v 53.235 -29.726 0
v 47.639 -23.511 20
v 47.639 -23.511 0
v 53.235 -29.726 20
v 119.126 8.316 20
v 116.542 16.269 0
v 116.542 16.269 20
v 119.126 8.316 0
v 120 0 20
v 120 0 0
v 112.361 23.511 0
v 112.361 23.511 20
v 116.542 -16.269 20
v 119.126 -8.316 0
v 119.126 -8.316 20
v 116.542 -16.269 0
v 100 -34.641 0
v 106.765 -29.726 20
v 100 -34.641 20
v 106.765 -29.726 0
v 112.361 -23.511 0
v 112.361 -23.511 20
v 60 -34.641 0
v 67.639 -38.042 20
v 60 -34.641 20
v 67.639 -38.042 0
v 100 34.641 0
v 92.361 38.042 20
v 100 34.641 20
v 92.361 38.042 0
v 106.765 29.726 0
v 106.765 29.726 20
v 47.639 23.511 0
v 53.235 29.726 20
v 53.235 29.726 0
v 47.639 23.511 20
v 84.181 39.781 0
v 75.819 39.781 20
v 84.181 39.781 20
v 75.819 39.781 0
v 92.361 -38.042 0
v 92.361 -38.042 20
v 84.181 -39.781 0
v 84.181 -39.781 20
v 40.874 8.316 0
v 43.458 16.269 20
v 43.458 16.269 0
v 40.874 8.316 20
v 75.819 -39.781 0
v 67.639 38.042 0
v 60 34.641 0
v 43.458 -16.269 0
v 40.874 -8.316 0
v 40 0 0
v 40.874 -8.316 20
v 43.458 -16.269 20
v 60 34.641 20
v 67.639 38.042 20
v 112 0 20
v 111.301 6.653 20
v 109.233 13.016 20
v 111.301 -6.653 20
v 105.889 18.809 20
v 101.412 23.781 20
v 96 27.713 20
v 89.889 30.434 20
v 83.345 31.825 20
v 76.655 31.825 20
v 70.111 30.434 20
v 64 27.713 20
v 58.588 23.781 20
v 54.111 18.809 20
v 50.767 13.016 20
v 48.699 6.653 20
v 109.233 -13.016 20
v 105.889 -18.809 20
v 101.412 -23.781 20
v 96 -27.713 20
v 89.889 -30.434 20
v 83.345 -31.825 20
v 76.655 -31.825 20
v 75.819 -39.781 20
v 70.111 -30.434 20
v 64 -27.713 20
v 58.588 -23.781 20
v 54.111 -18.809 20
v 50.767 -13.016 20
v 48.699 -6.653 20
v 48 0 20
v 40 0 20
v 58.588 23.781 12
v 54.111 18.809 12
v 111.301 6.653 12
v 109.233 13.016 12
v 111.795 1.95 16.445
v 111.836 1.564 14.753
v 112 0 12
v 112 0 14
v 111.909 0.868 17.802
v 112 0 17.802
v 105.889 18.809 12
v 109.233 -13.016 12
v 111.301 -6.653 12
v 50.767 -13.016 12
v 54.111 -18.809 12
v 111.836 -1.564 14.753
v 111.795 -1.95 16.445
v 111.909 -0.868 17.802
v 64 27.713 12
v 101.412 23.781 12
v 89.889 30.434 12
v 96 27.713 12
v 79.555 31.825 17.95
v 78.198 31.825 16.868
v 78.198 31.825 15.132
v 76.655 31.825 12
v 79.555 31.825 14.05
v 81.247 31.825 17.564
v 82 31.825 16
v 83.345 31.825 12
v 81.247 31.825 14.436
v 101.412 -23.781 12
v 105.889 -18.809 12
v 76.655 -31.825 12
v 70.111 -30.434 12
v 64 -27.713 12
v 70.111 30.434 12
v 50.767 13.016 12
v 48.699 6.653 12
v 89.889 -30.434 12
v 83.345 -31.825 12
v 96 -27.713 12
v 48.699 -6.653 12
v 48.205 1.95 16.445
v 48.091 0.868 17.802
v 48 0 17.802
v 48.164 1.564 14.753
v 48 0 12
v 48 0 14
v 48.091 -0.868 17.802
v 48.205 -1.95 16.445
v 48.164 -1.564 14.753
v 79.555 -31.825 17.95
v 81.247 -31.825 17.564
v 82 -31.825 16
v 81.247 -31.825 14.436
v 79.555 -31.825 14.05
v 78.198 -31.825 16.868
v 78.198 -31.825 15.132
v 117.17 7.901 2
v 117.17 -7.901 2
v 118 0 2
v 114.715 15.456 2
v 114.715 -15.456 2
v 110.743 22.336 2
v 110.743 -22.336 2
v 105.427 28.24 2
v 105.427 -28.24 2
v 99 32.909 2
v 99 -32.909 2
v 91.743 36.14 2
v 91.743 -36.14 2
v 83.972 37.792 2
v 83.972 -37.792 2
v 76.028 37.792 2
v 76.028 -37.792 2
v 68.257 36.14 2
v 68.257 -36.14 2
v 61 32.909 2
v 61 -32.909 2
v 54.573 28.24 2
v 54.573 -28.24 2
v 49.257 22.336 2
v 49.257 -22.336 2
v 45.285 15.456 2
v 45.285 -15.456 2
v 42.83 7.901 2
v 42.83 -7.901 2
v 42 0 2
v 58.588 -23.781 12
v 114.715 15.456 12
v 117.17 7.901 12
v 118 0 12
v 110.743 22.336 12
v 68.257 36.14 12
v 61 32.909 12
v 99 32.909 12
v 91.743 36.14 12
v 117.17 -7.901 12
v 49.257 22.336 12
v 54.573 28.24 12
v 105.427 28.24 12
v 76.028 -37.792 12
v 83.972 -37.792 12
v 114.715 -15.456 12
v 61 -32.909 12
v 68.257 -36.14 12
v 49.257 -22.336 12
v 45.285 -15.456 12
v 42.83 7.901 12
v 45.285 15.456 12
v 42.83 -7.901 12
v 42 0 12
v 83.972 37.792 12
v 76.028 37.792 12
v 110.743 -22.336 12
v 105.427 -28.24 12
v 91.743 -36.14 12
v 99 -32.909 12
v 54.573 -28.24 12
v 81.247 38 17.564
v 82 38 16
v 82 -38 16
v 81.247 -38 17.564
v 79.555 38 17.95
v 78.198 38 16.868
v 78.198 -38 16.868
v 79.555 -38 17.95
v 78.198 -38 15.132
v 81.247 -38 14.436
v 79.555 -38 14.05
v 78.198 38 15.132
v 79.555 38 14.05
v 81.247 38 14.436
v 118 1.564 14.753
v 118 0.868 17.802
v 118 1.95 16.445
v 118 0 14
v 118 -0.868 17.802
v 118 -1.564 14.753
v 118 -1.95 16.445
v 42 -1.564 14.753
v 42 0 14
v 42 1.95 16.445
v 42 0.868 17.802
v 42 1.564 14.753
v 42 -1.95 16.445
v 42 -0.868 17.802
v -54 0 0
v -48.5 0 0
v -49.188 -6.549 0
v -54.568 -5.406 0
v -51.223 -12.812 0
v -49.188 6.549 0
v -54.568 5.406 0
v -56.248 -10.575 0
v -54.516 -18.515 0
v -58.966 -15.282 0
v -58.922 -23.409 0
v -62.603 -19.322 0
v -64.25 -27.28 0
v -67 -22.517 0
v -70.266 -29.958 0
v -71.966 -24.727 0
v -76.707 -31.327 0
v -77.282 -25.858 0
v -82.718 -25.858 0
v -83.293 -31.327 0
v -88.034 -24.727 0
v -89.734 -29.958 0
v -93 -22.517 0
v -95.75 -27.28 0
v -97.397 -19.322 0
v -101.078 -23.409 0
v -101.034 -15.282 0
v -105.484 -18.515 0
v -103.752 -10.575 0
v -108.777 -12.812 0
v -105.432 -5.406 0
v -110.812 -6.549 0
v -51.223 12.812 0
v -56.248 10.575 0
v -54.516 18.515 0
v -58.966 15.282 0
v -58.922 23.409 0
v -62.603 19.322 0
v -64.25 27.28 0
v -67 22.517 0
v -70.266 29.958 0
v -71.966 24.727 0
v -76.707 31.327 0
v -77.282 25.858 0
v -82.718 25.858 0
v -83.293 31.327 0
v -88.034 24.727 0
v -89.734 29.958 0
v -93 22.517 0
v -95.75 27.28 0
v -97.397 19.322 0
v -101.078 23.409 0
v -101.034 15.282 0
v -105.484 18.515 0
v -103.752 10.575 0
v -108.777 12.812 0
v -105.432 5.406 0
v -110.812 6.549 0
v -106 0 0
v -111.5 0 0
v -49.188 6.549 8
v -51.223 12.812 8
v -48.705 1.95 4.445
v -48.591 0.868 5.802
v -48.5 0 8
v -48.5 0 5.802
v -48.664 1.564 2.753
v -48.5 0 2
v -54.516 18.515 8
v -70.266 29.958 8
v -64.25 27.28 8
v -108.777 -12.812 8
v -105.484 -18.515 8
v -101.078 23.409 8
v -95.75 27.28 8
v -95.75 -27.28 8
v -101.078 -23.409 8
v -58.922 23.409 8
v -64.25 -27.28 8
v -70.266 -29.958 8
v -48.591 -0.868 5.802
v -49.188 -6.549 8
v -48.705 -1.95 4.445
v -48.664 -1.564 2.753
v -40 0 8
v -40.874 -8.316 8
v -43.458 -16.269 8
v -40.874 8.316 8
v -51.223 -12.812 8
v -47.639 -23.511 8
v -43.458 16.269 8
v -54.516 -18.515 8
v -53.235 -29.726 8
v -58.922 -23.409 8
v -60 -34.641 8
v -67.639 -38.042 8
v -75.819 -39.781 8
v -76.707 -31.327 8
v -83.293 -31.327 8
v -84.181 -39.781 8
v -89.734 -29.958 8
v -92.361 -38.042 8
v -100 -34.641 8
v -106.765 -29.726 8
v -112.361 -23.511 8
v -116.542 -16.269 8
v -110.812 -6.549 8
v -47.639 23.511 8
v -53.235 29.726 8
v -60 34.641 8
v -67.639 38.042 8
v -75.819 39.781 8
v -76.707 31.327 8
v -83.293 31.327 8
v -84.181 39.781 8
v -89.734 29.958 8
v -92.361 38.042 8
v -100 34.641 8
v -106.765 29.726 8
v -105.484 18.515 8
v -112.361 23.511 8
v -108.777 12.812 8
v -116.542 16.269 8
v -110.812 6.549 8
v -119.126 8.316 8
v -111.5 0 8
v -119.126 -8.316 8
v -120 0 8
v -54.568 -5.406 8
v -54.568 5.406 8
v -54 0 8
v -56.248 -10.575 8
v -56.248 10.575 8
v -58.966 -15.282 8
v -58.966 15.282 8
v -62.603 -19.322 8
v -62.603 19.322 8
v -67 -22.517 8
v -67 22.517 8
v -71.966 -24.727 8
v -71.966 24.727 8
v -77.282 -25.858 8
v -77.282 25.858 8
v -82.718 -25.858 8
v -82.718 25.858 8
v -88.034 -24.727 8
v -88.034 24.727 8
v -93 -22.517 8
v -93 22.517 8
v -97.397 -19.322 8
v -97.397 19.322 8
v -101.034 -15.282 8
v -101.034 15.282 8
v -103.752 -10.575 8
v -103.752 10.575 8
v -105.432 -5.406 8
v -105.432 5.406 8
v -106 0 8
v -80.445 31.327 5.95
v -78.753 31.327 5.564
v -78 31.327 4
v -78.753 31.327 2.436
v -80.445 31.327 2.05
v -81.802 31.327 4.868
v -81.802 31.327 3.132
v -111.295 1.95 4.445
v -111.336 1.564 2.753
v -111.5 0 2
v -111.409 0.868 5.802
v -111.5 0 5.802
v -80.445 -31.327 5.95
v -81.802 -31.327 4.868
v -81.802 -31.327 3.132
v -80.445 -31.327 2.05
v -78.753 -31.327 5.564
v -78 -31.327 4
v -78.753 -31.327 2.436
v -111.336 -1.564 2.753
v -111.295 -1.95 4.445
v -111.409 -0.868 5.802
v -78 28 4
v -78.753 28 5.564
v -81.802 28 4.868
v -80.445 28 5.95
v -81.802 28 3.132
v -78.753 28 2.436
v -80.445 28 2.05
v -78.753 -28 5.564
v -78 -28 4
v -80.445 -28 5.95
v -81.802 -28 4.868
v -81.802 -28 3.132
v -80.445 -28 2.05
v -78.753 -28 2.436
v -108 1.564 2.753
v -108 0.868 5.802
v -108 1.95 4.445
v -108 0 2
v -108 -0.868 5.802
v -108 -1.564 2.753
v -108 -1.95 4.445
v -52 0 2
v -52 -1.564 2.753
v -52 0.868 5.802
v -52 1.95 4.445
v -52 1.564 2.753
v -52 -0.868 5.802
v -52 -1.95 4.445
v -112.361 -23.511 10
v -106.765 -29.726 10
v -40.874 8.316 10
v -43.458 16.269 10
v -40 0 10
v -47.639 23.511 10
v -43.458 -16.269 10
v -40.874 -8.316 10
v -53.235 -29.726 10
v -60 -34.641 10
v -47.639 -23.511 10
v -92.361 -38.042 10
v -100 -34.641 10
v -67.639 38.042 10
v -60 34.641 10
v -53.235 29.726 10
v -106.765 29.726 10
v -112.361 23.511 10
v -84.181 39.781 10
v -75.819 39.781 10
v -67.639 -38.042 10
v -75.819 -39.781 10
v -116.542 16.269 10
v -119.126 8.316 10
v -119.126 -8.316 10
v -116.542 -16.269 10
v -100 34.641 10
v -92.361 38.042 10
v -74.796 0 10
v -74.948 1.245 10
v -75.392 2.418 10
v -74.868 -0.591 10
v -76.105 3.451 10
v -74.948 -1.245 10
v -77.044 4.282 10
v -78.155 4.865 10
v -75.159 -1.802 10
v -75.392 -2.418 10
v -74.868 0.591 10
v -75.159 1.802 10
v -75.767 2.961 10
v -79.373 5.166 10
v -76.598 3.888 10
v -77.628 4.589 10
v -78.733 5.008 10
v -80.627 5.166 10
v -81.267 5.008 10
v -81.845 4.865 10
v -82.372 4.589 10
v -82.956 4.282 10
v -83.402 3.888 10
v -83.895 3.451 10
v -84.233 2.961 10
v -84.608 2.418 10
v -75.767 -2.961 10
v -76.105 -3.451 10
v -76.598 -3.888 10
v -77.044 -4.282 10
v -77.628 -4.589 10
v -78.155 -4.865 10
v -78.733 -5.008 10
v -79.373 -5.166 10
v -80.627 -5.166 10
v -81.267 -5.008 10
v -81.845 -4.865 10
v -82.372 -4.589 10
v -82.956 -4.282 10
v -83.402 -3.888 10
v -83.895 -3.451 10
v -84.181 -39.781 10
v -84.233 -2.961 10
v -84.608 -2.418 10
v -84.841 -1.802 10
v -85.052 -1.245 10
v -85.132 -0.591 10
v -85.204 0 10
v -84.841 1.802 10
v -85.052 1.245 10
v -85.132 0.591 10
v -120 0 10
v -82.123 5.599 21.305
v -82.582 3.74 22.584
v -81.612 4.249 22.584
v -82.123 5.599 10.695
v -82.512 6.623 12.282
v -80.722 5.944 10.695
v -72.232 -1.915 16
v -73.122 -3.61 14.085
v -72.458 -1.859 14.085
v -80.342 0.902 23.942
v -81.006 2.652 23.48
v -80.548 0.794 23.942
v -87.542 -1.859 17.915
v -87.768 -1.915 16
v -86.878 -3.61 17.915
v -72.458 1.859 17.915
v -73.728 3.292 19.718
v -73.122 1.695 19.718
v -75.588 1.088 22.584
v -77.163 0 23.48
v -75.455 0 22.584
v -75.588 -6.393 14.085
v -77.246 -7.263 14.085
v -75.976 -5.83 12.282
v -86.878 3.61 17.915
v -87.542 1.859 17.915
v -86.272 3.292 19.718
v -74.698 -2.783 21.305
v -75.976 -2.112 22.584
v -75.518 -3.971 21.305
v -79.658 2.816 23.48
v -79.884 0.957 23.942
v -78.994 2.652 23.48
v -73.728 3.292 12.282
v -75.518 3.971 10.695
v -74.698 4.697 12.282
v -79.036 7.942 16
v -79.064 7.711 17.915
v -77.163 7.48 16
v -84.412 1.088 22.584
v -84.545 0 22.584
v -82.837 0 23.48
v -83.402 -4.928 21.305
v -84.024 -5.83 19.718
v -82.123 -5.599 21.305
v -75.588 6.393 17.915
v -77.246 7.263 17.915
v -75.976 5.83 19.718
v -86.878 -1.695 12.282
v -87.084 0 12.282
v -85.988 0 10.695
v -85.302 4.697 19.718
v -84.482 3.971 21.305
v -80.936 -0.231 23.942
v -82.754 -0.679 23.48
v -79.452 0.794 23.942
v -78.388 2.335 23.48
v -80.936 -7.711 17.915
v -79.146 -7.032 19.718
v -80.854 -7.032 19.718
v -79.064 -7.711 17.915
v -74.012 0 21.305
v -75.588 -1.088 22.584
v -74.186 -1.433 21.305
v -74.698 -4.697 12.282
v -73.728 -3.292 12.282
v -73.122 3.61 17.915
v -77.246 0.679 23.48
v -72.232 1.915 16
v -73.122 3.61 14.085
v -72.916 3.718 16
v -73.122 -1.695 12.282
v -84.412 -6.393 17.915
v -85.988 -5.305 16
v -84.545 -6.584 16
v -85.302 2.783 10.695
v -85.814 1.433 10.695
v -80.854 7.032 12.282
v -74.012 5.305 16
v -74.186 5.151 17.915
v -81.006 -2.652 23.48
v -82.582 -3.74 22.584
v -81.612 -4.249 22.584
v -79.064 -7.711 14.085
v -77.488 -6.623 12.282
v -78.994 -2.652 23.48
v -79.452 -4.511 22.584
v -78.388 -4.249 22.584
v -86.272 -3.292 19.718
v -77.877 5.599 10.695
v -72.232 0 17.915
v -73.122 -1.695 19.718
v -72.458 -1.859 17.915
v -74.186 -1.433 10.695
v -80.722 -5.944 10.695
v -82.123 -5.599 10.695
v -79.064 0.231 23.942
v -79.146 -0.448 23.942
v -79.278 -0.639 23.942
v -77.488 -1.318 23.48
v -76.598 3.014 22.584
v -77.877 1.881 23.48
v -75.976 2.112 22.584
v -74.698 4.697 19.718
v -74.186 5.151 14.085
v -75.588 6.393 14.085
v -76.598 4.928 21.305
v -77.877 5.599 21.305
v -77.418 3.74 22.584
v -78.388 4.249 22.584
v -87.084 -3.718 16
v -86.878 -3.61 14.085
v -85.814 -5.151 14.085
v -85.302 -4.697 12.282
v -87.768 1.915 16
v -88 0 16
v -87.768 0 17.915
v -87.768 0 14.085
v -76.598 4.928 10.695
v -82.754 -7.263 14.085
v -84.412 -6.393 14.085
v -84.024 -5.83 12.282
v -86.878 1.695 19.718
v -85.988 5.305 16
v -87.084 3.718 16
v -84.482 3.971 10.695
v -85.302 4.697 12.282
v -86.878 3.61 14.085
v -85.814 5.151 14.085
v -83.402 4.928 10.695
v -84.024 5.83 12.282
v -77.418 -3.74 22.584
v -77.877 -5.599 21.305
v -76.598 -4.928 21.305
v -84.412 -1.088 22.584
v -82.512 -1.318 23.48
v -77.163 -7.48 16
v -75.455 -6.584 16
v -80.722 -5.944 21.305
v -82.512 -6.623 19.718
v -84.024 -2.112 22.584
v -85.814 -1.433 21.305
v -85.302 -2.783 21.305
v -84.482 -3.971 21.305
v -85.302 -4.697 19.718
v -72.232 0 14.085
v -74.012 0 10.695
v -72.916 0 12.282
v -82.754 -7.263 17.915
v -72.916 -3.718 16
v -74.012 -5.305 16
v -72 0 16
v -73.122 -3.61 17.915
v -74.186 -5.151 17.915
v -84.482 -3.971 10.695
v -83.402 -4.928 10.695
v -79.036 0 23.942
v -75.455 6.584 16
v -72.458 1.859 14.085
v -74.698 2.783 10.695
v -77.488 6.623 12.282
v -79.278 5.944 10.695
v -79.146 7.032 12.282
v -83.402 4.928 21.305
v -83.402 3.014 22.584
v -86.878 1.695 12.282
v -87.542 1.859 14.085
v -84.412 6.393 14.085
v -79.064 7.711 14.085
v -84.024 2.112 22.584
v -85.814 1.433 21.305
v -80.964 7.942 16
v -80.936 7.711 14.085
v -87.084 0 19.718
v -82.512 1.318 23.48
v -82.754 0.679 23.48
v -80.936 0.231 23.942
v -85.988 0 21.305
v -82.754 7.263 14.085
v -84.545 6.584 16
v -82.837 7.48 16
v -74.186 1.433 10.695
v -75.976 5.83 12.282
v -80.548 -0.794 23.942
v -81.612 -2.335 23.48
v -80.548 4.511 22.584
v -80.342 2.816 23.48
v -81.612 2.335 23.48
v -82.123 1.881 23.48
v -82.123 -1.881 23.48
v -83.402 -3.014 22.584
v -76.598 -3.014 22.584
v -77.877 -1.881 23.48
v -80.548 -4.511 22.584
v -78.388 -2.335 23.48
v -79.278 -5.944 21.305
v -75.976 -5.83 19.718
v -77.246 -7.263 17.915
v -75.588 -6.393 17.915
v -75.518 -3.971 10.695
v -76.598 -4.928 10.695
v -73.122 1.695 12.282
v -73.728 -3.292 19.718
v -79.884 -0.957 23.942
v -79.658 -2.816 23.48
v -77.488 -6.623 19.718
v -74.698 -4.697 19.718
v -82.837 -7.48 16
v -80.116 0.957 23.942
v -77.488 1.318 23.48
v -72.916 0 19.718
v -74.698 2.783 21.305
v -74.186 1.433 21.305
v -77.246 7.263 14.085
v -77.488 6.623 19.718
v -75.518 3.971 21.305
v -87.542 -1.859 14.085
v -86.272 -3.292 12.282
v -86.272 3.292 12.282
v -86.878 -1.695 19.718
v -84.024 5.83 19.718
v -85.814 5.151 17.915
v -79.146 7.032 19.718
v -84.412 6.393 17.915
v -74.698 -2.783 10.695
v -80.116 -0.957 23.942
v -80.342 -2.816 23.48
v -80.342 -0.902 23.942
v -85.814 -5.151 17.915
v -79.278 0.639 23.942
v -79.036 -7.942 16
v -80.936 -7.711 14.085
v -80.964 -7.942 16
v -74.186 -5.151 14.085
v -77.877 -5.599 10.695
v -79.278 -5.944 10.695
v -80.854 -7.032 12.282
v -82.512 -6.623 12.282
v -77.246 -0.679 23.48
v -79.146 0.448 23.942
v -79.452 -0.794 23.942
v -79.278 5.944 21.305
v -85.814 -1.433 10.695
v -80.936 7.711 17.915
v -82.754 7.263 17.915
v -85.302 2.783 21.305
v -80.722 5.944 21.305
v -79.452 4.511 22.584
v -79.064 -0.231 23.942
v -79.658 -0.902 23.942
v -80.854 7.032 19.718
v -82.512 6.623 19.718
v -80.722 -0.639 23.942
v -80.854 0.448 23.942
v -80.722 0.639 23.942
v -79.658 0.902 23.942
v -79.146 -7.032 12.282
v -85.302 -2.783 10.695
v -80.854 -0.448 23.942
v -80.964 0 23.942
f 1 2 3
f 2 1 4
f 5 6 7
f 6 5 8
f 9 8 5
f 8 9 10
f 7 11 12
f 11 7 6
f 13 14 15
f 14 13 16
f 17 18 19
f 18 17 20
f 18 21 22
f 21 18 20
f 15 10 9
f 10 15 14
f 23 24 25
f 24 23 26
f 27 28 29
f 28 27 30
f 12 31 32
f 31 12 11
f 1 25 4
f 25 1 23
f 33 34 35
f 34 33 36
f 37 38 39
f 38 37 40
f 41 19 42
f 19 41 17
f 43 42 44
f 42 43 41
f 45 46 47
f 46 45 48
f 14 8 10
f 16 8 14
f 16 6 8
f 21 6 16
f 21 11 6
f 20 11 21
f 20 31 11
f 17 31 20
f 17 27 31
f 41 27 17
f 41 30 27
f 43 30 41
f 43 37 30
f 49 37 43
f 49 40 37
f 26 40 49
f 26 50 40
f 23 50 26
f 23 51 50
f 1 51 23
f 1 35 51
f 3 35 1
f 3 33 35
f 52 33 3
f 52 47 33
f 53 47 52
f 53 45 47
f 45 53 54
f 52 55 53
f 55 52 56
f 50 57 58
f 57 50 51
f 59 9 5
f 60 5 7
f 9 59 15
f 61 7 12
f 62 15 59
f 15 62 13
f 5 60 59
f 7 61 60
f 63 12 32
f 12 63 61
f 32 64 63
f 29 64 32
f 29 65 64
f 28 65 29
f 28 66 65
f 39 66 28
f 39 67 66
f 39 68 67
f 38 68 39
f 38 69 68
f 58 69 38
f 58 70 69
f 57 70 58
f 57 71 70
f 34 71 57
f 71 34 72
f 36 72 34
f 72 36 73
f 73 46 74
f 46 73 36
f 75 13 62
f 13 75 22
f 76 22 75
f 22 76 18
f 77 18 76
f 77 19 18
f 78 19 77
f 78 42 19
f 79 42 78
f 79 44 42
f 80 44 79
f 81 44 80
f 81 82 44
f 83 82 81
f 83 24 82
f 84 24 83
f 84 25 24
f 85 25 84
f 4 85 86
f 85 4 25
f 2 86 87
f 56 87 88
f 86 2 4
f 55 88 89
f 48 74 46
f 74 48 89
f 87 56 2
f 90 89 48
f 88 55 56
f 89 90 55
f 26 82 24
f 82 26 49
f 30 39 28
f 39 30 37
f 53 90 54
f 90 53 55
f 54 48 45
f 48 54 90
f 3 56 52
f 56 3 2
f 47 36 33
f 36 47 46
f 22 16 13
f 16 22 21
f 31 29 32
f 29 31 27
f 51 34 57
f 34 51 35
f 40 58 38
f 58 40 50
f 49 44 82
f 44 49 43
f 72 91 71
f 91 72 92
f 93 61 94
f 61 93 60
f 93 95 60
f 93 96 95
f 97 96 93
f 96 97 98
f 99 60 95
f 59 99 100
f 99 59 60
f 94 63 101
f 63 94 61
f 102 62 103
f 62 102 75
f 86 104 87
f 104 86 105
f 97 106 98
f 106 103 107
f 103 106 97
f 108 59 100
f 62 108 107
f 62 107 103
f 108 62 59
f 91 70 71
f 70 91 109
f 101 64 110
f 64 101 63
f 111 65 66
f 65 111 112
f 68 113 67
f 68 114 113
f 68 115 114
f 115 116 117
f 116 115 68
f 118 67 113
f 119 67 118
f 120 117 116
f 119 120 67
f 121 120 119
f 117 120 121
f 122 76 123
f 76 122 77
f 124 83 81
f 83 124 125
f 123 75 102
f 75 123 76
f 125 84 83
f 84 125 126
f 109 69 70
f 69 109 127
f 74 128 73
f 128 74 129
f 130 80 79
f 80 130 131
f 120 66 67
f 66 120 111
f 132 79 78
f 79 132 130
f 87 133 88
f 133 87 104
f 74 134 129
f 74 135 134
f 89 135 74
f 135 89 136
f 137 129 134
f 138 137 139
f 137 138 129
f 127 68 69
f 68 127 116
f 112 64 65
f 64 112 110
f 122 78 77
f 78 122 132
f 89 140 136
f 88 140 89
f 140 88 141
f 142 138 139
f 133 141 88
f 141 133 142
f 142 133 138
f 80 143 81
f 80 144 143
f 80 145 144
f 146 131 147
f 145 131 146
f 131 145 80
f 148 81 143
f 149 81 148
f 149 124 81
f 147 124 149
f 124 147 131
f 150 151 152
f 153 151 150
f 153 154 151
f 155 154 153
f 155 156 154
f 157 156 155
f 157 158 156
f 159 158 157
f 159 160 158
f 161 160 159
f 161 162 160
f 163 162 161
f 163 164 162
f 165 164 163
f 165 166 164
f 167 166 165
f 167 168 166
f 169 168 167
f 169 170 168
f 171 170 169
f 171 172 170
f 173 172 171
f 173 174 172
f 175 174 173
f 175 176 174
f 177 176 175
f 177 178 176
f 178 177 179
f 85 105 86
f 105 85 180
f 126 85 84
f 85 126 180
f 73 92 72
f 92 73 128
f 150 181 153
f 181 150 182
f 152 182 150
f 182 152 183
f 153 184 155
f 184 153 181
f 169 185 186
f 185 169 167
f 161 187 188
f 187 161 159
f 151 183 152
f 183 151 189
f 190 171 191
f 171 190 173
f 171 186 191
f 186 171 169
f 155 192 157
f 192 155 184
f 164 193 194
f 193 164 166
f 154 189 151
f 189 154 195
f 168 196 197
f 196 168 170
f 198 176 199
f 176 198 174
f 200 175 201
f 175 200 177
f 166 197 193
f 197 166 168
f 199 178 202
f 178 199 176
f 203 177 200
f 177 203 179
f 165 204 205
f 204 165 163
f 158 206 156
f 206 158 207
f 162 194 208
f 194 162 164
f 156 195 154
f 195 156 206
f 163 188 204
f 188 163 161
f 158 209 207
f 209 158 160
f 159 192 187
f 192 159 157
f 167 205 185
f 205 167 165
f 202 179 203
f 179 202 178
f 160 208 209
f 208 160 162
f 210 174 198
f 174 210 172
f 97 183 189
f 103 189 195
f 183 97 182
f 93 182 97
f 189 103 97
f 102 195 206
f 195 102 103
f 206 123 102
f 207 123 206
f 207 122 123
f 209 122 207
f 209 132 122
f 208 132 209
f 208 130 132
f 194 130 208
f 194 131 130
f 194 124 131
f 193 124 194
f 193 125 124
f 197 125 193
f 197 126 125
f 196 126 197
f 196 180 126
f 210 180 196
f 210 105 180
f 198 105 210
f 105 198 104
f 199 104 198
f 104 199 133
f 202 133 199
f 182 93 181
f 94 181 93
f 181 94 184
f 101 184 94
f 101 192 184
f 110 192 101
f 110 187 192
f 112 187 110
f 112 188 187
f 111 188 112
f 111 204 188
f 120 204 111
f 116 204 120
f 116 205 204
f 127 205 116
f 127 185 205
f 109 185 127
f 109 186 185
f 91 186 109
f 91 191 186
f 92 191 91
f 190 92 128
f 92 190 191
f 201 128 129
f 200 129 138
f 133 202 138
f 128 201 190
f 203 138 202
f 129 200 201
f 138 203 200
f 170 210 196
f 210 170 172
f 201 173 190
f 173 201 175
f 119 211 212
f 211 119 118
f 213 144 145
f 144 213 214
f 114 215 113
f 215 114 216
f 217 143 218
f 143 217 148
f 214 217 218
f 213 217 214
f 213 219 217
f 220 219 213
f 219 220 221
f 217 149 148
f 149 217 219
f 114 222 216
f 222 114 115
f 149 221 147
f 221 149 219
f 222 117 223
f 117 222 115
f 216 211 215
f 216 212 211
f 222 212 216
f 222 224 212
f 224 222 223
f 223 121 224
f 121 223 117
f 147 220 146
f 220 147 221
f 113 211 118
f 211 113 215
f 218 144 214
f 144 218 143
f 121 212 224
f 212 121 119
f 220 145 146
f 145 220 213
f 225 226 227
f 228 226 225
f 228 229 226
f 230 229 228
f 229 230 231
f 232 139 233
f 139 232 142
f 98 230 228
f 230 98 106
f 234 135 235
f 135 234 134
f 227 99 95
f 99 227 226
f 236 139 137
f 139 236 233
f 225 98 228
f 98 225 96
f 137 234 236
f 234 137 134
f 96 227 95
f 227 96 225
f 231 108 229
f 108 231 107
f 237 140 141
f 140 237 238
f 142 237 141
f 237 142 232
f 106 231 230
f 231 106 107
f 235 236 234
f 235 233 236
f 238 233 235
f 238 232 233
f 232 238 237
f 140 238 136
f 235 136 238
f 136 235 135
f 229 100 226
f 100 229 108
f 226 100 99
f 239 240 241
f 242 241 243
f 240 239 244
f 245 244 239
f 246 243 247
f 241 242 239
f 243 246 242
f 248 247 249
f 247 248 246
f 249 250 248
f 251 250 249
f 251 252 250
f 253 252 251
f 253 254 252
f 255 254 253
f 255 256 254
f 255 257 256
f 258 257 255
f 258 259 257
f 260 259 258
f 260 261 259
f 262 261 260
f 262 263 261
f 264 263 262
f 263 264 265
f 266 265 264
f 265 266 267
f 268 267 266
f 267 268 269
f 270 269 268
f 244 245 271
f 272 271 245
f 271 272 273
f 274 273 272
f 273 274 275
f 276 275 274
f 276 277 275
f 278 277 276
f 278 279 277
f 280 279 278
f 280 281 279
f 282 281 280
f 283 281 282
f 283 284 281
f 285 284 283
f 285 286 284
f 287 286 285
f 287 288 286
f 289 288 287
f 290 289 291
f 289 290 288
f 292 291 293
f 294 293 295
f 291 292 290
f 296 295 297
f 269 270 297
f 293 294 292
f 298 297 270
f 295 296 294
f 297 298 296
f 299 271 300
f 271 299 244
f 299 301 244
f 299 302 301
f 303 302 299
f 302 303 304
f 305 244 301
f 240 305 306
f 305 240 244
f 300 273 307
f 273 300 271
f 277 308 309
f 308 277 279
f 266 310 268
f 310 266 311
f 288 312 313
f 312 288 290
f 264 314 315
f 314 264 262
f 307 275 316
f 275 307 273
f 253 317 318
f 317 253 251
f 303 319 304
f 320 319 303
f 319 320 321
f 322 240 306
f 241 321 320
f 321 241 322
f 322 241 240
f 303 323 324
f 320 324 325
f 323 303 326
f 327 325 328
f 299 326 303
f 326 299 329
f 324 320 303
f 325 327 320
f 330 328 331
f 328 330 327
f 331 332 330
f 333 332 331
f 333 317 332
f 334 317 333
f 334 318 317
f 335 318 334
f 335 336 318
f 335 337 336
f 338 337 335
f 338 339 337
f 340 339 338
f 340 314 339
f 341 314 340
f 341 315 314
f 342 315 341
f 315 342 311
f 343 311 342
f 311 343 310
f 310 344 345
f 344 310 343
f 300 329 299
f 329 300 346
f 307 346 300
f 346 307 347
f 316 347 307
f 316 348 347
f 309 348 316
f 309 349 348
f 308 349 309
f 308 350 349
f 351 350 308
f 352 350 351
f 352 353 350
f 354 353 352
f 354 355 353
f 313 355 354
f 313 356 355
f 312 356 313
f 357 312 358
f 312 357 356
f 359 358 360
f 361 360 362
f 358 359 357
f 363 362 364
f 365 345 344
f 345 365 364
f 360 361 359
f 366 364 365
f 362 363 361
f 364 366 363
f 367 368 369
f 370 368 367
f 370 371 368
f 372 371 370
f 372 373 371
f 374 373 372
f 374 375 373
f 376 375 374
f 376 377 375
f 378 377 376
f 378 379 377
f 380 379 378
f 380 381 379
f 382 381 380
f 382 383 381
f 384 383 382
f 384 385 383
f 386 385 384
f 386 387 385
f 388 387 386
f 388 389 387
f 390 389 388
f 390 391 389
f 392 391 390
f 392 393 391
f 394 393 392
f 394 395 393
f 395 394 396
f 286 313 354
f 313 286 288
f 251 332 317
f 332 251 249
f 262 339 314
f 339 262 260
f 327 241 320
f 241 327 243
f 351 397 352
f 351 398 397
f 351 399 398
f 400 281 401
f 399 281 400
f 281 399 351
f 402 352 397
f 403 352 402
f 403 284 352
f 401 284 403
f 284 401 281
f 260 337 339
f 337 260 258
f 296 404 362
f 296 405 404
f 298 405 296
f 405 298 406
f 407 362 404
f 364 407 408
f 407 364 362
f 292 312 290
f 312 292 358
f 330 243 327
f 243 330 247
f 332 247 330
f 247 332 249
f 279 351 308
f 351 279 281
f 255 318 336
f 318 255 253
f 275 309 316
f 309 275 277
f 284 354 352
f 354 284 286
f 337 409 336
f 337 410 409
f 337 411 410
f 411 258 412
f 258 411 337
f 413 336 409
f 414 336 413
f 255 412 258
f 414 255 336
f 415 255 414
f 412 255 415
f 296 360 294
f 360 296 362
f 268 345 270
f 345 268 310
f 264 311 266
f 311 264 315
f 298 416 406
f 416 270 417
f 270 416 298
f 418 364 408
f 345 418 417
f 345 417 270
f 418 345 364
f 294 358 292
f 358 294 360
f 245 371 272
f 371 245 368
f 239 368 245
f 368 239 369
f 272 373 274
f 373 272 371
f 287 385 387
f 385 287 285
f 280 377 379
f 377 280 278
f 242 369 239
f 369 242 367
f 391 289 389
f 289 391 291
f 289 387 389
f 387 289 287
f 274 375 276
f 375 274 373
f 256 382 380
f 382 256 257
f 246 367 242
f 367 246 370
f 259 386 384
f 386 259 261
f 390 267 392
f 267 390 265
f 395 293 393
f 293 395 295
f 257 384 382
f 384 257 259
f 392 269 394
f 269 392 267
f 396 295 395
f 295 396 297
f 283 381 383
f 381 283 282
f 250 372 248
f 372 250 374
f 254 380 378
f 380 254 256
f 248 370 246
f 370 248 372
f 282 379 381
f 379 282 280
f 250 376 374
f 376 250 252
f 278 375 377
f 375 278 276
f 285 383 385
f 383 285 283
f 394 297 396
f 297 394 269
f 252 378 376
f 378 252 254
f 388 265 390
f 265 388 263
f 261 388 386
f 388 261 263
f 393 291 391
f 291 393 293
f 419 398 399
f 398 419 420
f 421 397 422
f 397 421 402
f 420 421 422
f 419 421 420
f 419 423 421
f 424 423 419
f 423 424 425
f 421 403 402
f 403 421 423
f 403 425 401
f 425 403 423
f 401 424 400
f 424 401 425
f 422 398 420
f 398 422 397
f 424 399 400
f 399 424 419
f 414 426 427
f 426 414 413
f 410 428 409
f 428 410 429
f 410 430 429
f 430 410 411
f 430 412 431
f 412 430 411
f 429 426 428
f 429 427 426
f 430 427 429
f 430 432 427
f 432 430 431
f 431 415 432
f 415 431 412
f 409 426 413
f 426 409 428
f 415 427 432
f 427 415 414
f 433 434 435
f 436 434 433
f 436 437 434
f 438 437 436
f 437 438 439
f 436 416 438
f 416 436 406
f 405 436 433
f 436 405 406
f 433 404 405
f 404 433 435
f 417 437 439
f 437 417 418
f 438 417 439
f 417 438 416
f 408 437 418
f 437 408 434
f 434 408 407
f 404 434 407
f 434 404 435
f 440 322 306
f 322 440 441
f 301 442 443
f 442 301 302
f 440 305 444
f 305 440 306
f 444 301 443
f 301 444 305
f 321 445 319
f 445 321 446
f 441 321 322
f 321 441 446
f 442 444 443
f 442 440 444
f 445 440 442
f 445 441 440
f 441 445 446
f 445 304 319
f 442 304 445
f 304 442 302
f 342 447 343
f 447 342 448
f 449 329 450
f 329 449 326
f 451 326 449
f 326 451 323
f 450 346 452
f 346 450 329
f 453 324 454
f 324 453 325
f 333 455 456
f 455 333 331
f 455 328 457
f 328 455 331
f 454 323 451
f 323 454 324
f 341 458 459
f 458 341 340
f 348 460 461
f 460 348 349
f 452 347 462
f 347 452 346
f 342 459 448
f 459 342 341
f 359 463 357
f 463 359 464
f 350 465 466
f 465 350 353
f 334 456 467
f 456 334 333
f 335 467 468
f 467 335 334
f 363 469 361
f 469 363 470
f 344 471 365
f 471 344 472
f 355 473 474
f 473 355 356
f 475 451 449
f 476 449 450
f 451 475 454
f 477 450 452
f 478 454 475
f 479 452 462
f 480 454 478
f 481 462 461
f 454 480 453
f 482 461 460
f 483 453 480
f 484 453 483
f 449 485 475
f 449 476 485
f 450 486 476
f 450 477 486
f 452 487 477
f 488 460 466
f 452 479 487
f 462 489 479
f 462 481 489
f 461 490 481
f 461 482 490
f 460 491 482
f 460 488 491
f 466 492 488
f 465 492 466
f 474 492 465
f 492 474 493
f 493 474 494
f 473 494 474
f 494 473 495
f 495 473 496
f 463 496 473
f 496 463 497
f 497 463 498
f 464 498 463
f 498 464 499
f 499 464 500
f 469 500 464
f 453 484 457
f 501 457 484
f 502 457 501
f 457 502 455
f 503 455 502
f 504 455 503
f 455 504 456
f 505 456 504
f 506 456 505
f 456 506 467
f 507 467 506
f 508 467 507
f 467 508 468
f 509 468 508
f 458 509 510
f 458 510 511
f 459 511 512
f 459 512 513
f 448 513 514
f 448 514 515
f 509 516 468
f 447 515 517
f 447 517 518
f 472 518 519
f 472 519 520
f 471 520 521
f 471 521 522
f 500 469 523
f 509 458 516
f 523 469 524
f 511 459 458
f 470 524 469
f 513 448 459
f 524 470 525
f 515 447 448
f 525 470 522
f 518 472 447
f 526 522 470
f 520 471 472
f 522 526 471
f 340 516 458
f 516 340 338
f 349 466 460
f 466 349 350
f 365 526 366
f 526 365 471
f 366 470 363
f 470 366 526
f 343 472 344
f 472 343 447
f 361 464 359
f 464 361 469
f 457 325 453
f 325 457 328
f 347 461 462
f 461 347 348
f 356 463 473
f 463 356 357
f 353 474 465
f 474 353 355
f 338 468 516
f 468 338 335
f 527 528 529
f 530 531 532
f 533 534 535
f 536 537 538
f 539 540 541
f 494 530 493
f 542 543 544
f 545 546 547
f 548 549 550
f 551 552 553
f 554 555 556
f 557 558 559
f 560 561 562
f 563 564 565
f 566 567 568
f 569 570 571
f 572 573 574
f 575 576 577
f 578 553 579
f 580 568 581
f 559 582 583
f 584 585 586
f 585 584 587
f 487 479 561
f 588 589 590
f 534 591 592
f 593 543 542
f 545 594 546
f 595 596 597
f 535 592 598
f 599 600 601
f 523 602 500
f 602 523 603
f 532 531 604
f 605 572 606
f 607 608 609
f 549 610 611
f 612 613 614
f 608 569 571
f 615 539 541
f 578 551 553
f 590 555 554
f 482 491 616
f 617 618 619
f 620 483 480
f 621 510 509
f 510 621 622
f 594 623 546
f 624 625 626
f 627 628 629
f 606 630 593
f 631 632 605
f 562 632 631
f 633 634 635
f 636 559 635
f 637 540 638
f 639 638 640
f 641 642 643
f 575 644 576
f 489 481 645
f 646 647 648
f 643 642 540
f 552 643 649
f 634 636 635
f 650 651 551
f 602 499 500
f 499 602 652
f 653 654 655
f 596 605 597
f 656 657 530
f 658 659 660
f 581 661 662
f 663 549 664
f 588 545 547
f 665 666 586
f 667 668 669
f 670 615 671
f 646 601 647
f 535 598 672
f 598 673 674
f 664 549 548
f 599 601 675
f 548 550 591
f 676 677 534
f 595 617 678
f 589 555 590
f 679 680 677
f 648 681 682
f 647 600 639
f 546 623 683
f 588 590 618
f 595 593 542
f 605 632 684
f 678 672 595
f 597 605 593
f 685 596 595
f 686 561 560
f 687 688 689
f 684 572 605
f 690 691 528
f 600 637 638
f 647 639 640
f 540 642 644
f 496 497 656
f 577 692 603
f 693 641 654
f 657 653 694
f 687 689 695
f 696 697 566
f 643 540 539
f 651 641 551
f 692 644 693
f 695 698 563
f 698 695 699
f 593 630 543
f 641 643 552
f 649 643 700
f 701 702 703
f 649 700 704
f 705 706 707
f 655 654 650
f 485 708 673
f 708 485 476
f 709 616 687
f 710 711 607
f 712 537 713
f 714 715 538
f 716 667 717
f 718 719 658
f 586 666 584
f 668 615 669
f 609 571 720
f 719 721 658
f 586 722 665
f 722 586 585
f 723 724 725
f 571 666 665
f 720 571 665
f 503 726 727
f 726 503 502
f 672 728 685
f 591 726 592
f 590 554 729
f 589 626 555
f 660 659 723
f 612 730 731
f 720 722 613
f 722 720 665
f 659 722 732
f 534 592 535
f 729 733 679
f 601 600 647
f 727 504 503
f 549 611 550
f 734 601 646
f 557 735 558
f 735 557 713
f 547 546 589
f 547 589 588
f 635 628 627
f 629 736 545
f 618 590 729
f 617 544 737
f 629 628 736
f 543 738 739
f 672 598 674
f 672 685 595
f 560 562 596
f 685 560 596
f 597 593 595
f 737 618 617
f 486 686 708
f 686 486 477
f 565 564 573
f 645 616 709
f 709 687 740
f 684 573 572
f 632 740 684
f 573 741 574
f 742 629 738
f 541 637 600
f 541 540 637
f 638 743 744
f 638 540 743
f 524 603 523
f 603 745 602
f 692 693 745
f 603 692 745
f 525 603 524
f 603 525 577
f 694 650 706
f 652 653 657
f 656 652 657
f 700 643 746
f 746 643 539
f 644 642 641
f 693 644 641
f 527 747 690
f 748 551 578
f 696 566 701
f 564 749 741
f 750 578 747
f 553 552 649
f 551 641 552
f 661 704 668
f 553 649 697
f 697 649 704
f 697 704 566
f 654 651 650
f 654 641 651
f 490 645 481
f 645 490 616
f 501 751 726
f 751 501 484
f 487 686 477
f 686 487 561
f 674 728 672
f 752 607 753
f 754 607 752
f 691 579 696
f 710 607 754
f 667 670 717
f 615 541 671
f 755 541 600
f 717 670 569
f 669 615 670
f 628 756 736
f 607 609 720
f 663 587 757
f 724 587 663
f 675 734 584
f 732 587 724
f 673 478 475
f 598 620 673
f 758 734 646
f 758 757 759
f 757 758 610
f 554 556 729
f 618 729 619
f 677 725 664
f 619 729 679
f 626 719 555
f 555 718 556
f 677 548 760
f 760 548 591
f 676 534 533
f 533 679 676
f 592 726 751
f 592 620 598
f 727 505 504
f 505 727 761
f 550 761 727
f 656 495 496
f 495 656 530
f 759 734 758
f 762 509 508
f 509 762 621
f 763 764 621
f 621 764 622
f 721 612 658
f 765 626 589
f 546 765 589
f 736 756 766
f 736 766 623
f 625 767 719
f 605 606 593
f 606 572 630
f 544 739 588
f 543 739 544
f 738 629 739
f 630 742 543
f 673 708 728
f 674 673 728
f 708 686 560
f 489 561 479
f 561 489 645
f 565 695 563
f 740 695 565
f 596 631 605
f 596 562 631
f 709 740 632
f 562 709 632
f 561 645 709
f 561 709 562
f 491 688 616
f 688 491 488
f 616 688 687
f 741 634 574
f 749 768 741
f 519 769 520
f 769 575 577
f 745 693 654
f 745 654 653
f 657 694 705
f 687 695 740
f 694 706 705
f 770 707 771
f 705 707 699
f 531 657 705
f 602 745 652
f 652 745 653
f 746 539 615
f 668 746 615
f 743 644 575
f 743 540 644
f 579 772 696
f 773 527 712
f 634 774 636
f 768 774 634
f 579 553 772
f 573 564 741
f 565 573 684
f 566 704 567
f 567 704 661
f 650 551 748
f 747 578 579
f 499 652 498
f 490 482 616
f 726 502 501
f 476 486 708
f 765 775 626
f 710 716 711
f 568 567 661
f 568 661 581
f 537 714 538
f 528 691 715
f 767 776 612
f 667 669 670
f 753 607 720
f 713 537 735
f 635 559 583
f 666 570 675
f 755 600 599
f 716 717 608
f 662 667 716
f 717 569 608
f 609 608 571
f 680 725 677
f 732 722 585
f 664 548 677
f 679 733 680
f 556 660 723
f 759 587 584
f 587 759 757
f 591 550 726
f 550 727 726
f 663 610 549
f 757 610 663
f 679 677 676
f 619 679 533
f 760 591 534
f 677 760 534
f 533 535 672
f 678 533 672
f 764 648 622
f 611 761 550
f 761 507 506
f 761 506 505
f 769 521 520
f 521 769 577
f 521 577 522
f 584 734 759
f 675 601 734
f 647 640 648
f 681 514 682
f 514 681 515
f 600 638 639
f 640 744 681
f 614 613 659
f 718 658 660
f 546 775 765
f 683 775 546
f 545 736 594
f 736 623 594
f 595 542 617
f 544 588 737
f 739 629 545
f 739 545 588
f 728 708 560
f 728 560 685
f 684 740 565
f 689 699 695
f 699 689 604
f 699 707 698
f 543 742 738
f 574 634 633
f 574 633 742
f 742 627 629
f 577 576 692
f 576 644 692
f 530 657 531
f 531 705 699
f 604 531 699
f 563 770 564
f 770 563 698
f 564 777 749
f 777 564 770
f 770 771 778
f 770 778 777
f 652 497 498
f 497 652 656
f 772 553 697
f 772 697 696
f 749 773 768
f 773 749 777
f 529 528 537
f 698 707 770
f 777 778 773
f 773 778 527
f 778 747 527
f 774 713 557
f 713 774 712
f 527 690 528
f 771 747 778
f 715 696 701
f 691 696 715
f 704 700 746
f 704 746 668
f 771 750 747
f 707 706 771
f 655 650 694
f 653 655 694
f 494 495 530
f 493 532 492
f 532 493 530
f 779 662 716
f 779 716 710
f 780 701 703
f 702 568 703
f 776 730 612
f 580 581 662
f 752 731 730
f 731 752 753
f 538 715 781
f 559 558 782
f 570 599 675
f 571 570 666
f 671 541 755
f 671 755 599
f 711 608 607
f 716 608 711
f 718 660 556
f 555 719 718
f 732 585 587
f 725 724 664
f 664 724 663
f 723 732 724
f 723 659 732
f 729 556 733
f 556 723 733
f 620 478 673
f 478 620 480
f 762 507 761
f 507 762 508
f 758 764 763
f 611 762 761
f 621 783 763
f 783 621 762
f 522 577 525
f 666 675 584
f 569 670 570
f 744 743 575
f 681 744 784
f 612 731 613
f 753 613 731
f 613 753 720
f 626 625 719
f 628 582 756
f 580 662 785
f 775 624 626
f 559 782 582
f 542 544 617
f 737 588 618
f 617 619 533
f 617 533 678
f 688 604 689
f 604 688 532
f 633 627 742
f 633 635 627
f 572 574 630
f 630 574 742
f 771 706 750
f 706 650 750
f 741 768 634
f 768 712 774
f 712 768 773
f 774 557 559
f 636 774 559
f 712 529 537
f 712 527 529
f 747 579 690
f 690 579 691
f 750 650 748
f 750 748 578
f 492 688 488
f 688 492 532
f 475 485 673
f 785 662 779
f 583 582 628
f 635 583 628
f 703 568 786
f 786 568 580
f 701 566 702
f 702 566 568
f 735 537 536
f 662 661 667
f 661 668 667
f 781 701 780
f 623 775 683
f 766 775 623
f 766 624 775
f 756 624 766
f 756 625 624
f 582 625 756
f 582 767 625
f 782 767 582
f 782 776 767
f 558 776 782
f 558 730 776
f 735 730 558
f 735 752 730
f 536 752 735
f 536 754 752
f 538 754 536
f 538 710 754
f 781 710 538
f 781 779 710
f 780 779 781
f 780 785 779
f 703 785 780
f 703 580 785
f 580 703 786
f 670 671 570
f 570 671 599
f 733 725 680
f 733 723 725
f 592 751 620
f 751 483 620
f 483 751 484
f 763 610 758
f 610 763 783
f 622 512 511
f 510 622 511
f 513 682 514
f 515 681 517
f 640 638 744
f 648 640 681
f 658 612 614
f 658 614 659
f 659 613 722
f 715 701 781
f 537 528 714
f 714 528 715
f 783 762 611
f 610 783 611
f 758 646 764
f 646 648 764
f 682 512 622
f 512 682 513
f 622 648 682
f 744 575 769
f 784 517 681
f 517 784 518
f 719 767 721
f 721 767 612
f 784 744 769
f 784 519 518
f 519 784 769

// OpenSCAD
// file: lid.scad
// Centrifugal Puzzle Box - Base Model

module cpbLid(radius, thickness, clearance){
    difference(){
        cylinder(h=4*thickness, r=radius-4*thickness-clearance);
        cylinder(h=4*thickness, r=radius-7*thickness);
        translate([0,radius-4*thickness,2*thickness]) 
            rotate([90,0,0]) 
                cylinder(h=4*thickness, r=thickness, center=true);
        translate([0,-radius+4*thickness,2*thickness]) 
            rotate([90,0,0]) 
                cylinder(h=4*thickness, r=thickness, center=true);
        translate([-radius+4*thickness,0,2*thickness]) 
            rotate([0,90,0]) 
                cylinder(h=4*thickness, r=thickness, center=true);
        translate([radius-4*thickness,0,2*thickness]) 
            rotate([0,90,0]) 
                cylinder(h=4*thickness, r=thickness, center=true);
    }
    translate([0,0,4*thickness]) 
        cylinder(h=thickness, r=radius);
    translate([0,0,8*thickness]) 
        sphere(r=4*thickness);
}




// Main Model
radius = 40;
width = 20;
thickness = 2;

clearance = 0.5;

cpbLid(radius, thickness, clearance);
// file: base.scad
// Centrifugal Puzzle Box - Base Model

module cpbBase(radius, width, thickness, clearance){
    difference(){
        // Main Body
        cylinder(h=width, r=radius);
        // Entrance Hole
        translate([0,0,thickness]) 
            cylinder(h=width, r=radius-4*thickness);
        // Container Hole
        translate([0,0,thickness]) 
            cylinder(h=width-5*thickness, r=radius-thickness);
        // Pin Holes
        translate([0,0,width - 2*thickness]) 
            rotate([90,0,0])
                cylinder(h=2*radius-2*thickness, r=thickness, center=true);
        translate([0,0,width - 2*thickness]) 
            rotate([0,90,0])
                cylinder(h=2*radius-2*thickness, r=thickness, center=true);
    }
}




// Main Model
radius = 40;
width = 20;
thickness = 2;

clearance = 0.5;

cpbBase(radius, width, thickness, clearance);
// main file
// Centrifugal Puzzle Box - Printing Model


// Parts
use <base.scad>
use <lid.scad>


// Main Model
radius = 40;
width = 20;
thickness = 2;

clearance = 0.5;

translate([2*radius,0,0])
    cpbBase(radius, width, thickness, clearance);
translate([-2*radius,0,0])
    cpbLid(radius, thickness, clearance);
